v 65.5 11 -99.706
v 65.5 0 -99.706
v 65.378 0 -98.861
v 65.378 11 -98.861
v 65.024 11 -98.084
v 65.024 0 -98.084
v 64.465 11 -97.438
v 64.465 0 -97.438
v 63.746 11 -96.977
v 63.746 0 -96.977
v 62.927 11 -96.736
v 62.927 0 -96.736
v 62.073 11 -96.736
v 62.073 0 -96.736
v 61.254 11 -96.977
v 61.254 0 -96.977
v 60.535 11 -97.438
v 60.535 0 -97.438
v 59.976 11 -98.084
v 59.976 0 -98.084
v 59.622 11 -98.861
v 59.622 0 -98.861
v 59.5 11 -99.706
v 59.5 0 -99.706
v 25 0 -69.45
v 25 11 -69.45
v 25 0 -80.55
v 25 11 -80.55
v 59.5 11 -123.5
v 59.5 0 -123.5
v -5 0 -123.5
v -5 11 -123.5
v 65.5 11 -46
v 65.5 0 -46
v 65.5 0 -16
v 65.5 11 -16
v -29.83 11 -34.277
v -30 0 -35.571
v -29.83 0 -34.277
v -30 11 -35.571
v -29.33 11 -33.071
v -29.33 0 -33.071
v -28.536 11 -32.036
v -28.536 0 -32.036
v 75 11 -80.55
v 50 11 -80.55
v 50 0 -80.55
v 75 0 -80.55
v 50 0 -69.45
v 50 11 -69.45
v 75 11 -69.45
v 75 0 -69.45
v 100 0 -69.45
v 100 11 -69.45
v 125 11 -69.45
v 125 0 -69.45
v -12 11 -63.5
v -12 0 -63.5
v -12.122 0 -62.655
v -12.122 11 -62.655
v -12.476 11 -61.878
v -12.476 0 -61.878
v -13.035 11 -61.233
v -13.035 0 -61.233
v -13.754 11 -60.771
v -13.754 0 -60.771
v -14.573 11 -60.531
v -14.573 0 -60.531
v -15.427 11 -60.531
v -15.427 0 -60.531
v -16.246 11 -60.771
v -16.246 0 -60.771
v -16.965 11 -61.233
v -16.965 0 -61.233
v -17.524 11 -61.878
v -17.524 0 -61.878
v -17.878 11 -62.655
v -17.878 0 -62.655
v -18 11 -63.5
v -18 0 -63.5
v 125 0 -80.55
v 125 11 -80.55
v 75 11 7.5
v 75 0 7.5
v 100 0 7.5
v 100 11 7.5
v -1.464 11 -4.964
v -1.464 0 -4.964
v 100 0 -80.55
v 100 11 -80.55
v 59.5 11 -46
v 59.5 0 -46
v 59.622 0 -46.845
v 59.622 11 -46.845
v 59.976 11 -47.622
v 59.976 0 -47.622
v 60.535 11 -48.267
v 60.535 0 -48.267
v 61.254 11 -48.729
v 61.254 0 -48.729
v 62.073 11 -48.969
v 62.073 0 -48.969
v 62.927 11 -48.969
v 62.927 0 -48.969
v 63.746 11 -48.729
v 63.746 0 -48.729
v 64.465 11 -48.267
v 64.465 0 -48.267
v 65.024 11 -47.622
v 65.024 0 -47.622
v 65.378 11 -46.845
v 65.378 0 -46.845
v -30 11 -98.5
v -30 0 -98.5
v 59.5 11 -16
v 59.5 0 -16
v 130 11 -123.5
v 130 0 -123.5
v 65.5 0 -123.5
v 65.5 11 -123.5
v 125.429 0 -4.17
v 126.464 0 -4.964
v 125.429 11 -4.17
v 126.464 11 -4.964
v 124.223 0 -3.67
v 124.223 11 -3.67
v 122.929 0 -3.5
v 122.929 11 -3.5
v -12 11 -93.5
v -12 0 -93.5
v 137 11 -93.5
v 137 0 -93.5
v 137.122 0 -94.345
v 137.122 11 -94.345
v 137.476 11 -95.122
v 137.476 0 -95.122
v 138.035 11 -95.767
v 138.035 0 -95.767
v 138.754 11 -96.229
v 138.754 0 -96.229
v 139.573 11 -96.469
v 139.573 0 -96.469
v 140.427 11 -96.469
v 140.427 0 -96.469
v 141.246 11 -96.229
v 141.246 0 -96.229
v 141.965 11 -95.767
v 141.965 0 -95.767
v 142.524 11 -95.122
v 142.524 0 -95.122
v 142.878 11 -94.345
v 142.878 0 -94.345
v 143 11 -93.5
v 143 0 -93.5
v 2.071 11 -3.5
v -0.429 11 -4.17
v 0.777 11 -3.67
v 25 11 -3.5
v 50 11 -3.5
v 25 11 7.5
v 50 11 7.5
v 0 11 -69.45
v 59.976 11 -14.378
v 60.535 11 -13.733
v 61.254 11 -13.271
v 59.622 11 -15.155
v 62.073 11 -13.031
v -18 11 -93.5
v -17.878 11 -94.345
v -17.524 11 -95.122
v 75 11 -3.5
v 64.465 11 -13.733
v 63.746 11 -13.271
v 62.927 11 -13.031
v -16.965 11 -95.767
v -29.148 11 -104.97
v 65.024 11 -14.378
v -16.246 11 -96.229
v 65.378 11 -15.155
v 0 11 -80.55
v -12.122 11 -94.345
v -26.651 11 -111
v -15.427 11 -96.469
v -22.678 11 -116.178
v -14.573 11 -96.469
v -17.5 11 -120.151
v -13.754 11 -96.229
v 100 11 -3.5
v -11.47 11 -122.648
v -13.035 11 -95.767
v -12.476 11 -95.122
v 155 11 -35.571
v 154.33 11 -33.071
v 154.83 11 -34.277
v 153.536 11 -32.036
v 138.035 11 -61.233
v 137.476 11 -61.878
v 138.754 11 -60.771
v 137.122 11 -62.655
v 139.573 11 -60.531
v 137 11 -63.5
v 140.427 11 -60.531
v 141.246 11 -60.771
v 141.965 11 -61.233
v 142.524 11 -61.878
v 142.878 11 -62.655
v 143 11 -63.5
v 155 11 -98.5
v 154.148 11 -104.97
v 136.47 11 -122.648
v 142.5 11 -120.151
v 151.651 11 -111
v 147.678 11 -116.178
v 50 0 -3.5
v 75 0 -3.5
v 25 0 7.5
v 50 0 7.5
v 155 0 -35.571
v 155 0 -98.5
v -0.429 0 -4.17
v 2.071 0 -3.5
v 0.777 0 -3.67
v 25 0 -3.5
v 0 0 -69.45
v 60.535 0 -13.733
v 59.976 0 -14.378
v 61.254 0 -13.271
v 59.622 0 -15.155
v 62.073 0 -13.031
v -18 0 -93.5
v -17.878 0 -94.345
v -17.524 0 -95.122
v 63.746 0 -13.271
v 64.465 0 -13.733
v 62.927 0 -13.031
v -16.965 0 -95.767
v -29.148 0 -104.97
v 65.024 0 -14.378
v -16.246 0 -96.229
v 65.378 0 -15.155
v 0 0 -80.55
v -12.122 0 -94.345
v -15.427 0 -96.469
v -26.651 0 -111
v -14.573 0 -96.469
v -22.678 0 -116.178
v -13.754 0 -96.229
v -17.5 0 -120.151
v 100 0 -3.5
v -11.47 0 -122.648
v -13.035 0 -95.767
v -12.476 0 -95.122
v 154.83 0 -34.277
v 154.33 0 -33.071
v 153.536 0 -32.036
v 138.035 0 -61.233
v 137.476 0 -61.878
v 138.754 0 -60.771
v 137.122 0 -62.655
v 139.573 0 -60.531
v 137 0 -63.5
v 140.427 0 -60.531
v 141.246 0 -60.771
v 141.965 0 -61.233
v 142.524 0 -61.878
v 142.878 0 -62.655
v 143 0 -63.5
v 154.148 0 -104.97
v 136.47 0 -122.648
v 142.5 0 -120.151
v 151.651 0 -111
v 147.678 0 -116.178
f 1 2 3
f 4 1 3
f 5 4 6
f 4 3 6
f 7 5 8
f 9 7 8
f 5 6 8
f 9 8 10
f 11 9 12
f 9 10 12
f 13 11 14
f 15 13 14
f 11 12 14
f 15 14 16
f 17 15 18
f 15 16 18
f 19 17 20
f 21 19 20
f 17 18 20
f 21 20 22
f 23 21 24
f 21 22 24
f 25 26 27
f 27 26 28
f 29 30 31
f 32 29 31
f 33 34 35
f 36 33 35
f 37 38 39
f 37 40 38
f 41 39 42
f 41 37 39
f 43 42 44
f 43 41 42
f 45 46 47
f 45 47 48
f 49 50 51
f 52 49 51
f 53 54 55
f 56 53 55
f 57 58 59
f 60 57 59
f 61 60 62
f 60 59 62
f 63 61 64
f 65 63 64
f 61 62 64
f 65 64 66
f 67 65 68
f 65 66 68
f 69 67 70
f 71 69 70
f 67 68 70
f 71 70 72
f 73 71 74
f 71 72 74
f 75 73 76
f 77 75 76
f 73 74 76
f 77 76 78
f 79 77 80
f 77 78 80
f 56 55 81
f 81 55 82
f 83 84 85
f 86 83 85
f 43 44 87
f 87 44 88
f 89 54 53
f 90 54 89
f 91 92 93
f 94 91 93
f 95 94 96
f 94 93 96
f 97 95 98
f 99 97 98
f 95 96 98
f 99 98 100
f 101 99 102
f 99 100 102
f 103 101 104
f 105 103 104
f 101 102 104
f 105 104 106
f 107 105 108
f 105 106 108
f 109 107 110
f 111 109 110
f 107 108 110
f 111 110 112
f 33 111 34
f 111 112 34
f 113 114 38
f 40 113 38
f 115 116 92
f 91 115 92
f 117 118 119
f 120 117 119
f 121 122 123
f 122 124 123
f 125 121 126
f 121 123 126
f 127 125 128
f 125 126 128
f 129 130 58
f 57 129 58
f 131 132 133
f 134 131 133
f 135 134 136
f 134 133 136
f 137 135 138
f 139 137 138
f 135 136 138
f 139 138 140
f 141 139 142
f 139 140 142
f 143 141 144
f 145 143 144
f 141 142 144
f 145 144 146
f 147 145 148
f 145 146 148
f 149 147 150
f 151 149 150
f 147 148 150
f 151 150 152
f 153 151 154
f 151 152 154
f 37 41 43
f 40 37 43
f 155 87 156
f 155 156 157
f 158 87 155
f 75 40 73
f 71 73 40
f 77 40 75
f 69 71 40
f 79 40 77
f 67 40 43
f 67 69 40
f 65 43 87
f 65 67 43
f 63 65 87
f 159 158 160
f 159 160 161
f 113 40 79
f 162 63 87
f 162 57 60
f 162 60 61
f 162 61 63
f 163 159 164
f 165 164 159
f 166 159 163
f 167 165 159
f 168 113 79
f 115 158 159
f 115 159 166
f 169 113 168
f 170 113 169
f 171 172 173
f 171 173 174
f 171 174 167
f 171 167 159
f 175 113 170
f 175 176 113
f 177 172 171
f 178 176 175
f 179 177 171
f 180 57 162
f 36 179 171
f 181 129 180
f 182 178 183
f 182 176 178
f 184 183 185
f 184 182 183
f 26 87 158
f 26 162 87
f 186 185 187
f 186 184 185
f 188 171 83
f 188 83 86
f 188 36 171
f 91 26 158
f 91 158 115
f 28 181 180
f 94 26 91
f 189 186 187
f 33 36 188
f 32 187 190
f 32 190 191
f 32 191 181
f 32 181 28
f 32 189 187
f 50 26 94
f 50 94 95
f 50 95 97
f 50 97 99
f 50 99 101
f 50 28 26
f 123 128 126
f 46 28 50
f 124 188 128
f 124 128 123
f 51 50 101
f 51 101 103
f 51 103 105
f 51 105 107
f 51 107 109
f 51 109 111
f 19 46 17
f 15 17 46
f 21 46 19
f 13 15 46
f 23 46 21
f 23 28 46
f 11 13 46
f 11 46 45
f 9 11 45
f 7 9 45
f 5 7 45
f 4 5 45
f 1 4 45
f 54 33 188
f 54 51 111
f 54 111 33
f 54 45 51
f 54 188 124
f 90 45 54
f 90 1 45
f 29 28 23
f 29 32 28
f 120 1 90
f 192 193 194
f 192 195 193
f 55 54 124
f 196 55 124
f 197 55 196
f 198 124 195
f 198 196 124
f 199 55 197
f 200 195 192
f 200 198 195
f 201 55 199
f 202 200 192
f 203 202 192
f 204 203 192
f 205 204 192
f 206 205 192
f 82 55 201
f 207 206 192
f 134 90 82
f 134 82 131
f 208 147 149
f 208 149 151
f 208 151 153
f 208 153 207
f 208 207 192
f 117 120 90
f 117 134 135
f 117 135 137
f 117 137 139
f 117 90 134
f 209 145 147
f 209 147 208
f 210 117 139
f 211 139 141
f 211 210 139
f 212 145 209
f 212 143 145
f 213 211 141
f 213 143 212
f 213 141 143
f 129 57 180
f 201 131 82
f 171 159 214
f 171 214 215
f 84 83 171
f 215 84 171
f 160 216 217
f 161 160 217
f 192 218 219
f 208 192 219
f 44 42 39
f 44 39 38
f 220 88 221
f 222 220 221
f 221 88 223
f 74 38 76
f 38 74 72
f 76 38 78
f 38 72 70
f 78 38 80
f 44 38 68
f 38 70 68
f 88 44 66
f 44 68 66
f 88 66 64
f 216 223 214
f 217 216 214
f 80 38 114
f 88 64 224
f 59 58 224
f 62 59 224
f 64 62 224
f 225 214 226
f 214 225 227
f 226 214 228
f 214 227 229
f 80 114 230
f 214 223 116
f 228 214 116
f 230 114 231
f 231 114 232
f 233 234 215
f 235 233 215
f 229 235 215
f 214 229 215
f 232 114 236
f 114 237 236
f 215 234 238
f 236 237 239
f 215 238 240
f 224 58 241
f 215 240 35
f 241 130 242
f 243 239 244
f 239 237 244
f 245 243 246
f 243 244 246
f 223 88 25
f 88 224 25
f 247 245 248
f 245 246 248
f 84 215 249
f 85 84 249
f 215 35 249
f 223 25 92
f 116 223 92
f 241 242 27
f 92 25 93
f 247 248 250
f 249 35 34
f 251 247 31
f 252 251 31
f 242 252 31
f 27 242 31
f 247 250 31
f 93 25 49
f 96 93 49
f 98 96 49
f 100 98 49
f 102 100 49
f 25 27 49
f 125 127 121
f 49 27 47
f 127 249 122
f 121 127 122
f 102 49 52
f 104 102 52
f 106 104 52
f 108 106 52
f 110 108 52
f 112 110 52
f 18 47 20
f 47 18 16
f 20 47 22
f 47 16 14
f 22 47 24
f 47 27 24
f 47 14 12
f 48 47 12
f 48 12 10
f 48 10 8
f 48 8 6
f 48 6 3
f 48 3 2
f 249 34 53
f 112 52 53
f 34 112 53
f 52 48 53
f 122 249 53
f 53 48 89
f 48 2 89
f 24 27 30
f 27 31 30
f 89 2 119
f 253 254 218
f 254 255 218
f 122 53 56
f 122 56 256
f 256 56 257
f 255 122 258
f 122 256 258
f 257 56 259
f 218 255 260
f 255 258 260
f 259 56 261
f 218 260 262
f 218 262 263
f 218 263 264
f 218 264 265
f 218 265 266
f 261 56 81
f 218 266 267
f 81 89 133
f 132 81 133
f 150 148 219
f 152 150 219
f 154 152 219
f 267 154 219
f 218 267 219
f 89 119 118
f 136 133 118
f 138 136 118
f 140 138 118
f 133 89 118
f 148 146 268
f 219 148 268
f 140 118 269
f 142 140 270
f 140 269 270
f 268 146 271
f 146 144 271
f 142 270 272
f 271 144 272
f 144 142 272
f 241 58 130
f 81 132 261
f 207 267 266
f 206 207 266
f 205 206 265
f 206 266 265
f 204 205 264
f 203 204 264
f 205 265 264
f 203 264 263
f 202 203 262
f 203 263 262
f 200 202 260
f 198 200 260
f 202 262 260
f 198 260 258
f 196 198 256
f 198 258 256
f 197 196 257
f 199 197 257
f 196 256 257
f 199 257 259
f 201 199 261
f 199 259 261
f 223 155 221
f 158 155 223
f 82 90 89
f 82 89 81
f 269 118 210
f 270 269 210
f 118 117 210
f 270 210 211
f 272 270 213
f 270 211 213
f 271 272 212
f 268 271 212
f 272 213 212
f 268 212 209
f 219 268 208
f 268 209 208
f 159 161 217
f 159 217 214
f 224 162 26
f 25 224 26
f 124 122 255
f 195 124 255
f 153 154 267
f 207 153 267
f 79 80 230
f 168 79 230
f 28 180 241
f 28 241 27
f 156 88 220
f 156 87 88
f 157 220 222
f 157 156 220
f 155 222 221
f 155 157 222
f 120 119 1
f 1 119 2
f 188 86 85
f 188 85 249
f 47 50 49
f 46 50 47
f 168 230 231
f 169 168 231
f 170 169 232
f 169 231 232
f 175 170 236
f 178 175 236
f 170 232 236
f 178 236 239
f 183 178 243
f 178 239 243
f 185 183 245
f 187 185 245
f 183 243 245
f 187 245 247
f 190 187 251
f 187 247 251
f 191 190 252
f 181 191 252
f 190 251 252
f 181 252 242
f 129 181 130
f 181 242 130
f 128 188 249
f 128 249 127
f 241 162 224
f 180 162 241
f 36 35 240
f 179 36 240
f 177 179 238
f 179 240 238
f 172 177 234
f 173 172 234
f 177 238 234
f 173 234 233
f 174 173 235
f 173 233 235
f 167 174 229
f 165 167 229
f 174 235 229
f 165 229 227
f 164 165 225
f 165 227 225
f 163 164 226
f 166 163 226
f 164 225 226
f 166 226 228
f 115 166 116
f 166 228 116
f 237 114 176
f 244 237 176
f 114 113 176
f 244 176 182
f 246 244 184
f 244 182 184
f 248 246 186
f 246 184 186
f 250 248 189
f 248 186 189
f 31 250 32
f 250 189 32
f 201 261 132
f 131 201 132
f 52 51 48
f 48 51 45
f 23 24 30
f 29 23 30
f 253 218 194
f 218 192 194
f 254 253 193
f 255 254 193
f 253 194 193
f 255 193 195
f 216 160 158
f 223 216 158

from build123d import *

# Parameters (mm, degrees)
BOSS_EXTRUDE6_DEPTH = 11
SKETCH4_W           = 25
SKETCH4_H           = 11
SKETCH4_H_2         = 11.1
CUT_EXTRUDE1_DEPTH  = 12
FILLET1_R           = 25
FILLET2_R           = 5


with BuildPart() as part:
    # Sketch1 → Boss-Extrude6 (new body)
    with BuildSketch(Plane(origin=(0, 0, 0), x_dir=(1, 0, 0), z_dir=(0, 1, 0))):
        with BuildLine():
            Line((0, -7.5), (125, -7.5))
            Line((125, -7.5), (125, 3.5))
            Line((125, 3.5), (155, 33.5))
            Line((155, 33.5), (155, 123.5))
            Line((155, 123.5), (65.5, 123.5))
            Line((65.5, 123.5), (65.5, 99.705746838))
            ThreePointArc((65.5, 99.705746838), (62.5, 96.705746838), (59.5, 99.705746838))
            Line((59.5, 99.705746838), (59.5, 123.5))
            Line((59.5, 123.5), (-30, 123.5))
            Line((-30, 123.5), (-30, 33.5))
            Line((-30, 33.5), (0, 3.5))
            Line((0, 3.5), (0, -7.5))
        make_face()
        with BuildLine():
            Line((137, 63.5), (137, 93.5))
            ThreePointArc((137, 93.5), (140, 96.5), (143, 93.5))
            Line((143, 93.5), (143, 63.5))
            ThreePointArc((143, 63.5), (140, 60.5), (137, 63.5))
        make_face(mode=Mode.SUBTRACT)
        with BuildLine():
            Line((-18, 63.5), (-18, 93.5))
            ThreePointArc((-18, 93.5), (-15, 96.5), (-12, 93.5))
            Line((-12, 93.5), (-12, 63.5))
            ThreePointArc((-12, 63.5), (-15, 60.5), (-18, 63.5))
        make_face(mode=Mode.SUBTRACT)
        with BuildLine():
            Line((59.5, 16), (59.5, 46))
            ThreePointArc((59.5, 46), (62.5, 49), (65.5, 46))
            Line((65.5, 46), (65.5, 16))
            ThreePointArc((65.5, 16), (62.5, 13), (59.5, 16))
        make_face(mode=Mode.SUBTRACT)
    extrude(amount=BOSS_EXTRUDE6_DEPTH)

    # Sketch4 → Cut-Extrude1 (cut, through all)
    with BuildSketch(Plane(origin=(0, 11, 0), x_dir=(1, 0, 0), z_dir=(0, 1, 0))):
        with Locations((12.5, -2)):
            Rectangle(SKETCH4_W, SKETCH4_H)
        with Locations((62.5, -2)):
            Rectangle(SKETCH4_W, SKETCH4_H)
        with Locations((12.5, 75)):
            Rectangle(SKETCH4_W, SKETCH4_H_2)
        with Locations((112.5, -2)):
            Rectangle(SKETCH4_W, SKETCH4_H)
        with Locations((62.5, 75)):
            Rectangle(SKETCH4_W, SKETCH4_H_2)
        with Locations((112.5, 75)):
            Rectangle(SKETCH4_W, SKETCH4_H_2)
    extrude(amount=-CUT_EXTRUDE1_DEPTH, mode=Mode.SUBTRACT)

    # Fillet1
    fillet1_edges = [part.edges().sort_by_distance(p)[0] for p in [
        (-30, 5.5, -123.5),
        (155, 5.5, -123.5),
    ]]
    fillet(fillet1_edges, radius=FILLET1_R)

    # Fillet2
    fillet2_edges = [part.edges().sort_by_distance(p)[0] for p in [
        (0, 5.5, -3.5),
        (-30, 5.5, -33.5),
        (155, 5.5, -33.5),
        (125, 5.5, -3.5),
    ]]
    fillet(fillet2_edges, radius=FILLET2_R)


solid = part.part
